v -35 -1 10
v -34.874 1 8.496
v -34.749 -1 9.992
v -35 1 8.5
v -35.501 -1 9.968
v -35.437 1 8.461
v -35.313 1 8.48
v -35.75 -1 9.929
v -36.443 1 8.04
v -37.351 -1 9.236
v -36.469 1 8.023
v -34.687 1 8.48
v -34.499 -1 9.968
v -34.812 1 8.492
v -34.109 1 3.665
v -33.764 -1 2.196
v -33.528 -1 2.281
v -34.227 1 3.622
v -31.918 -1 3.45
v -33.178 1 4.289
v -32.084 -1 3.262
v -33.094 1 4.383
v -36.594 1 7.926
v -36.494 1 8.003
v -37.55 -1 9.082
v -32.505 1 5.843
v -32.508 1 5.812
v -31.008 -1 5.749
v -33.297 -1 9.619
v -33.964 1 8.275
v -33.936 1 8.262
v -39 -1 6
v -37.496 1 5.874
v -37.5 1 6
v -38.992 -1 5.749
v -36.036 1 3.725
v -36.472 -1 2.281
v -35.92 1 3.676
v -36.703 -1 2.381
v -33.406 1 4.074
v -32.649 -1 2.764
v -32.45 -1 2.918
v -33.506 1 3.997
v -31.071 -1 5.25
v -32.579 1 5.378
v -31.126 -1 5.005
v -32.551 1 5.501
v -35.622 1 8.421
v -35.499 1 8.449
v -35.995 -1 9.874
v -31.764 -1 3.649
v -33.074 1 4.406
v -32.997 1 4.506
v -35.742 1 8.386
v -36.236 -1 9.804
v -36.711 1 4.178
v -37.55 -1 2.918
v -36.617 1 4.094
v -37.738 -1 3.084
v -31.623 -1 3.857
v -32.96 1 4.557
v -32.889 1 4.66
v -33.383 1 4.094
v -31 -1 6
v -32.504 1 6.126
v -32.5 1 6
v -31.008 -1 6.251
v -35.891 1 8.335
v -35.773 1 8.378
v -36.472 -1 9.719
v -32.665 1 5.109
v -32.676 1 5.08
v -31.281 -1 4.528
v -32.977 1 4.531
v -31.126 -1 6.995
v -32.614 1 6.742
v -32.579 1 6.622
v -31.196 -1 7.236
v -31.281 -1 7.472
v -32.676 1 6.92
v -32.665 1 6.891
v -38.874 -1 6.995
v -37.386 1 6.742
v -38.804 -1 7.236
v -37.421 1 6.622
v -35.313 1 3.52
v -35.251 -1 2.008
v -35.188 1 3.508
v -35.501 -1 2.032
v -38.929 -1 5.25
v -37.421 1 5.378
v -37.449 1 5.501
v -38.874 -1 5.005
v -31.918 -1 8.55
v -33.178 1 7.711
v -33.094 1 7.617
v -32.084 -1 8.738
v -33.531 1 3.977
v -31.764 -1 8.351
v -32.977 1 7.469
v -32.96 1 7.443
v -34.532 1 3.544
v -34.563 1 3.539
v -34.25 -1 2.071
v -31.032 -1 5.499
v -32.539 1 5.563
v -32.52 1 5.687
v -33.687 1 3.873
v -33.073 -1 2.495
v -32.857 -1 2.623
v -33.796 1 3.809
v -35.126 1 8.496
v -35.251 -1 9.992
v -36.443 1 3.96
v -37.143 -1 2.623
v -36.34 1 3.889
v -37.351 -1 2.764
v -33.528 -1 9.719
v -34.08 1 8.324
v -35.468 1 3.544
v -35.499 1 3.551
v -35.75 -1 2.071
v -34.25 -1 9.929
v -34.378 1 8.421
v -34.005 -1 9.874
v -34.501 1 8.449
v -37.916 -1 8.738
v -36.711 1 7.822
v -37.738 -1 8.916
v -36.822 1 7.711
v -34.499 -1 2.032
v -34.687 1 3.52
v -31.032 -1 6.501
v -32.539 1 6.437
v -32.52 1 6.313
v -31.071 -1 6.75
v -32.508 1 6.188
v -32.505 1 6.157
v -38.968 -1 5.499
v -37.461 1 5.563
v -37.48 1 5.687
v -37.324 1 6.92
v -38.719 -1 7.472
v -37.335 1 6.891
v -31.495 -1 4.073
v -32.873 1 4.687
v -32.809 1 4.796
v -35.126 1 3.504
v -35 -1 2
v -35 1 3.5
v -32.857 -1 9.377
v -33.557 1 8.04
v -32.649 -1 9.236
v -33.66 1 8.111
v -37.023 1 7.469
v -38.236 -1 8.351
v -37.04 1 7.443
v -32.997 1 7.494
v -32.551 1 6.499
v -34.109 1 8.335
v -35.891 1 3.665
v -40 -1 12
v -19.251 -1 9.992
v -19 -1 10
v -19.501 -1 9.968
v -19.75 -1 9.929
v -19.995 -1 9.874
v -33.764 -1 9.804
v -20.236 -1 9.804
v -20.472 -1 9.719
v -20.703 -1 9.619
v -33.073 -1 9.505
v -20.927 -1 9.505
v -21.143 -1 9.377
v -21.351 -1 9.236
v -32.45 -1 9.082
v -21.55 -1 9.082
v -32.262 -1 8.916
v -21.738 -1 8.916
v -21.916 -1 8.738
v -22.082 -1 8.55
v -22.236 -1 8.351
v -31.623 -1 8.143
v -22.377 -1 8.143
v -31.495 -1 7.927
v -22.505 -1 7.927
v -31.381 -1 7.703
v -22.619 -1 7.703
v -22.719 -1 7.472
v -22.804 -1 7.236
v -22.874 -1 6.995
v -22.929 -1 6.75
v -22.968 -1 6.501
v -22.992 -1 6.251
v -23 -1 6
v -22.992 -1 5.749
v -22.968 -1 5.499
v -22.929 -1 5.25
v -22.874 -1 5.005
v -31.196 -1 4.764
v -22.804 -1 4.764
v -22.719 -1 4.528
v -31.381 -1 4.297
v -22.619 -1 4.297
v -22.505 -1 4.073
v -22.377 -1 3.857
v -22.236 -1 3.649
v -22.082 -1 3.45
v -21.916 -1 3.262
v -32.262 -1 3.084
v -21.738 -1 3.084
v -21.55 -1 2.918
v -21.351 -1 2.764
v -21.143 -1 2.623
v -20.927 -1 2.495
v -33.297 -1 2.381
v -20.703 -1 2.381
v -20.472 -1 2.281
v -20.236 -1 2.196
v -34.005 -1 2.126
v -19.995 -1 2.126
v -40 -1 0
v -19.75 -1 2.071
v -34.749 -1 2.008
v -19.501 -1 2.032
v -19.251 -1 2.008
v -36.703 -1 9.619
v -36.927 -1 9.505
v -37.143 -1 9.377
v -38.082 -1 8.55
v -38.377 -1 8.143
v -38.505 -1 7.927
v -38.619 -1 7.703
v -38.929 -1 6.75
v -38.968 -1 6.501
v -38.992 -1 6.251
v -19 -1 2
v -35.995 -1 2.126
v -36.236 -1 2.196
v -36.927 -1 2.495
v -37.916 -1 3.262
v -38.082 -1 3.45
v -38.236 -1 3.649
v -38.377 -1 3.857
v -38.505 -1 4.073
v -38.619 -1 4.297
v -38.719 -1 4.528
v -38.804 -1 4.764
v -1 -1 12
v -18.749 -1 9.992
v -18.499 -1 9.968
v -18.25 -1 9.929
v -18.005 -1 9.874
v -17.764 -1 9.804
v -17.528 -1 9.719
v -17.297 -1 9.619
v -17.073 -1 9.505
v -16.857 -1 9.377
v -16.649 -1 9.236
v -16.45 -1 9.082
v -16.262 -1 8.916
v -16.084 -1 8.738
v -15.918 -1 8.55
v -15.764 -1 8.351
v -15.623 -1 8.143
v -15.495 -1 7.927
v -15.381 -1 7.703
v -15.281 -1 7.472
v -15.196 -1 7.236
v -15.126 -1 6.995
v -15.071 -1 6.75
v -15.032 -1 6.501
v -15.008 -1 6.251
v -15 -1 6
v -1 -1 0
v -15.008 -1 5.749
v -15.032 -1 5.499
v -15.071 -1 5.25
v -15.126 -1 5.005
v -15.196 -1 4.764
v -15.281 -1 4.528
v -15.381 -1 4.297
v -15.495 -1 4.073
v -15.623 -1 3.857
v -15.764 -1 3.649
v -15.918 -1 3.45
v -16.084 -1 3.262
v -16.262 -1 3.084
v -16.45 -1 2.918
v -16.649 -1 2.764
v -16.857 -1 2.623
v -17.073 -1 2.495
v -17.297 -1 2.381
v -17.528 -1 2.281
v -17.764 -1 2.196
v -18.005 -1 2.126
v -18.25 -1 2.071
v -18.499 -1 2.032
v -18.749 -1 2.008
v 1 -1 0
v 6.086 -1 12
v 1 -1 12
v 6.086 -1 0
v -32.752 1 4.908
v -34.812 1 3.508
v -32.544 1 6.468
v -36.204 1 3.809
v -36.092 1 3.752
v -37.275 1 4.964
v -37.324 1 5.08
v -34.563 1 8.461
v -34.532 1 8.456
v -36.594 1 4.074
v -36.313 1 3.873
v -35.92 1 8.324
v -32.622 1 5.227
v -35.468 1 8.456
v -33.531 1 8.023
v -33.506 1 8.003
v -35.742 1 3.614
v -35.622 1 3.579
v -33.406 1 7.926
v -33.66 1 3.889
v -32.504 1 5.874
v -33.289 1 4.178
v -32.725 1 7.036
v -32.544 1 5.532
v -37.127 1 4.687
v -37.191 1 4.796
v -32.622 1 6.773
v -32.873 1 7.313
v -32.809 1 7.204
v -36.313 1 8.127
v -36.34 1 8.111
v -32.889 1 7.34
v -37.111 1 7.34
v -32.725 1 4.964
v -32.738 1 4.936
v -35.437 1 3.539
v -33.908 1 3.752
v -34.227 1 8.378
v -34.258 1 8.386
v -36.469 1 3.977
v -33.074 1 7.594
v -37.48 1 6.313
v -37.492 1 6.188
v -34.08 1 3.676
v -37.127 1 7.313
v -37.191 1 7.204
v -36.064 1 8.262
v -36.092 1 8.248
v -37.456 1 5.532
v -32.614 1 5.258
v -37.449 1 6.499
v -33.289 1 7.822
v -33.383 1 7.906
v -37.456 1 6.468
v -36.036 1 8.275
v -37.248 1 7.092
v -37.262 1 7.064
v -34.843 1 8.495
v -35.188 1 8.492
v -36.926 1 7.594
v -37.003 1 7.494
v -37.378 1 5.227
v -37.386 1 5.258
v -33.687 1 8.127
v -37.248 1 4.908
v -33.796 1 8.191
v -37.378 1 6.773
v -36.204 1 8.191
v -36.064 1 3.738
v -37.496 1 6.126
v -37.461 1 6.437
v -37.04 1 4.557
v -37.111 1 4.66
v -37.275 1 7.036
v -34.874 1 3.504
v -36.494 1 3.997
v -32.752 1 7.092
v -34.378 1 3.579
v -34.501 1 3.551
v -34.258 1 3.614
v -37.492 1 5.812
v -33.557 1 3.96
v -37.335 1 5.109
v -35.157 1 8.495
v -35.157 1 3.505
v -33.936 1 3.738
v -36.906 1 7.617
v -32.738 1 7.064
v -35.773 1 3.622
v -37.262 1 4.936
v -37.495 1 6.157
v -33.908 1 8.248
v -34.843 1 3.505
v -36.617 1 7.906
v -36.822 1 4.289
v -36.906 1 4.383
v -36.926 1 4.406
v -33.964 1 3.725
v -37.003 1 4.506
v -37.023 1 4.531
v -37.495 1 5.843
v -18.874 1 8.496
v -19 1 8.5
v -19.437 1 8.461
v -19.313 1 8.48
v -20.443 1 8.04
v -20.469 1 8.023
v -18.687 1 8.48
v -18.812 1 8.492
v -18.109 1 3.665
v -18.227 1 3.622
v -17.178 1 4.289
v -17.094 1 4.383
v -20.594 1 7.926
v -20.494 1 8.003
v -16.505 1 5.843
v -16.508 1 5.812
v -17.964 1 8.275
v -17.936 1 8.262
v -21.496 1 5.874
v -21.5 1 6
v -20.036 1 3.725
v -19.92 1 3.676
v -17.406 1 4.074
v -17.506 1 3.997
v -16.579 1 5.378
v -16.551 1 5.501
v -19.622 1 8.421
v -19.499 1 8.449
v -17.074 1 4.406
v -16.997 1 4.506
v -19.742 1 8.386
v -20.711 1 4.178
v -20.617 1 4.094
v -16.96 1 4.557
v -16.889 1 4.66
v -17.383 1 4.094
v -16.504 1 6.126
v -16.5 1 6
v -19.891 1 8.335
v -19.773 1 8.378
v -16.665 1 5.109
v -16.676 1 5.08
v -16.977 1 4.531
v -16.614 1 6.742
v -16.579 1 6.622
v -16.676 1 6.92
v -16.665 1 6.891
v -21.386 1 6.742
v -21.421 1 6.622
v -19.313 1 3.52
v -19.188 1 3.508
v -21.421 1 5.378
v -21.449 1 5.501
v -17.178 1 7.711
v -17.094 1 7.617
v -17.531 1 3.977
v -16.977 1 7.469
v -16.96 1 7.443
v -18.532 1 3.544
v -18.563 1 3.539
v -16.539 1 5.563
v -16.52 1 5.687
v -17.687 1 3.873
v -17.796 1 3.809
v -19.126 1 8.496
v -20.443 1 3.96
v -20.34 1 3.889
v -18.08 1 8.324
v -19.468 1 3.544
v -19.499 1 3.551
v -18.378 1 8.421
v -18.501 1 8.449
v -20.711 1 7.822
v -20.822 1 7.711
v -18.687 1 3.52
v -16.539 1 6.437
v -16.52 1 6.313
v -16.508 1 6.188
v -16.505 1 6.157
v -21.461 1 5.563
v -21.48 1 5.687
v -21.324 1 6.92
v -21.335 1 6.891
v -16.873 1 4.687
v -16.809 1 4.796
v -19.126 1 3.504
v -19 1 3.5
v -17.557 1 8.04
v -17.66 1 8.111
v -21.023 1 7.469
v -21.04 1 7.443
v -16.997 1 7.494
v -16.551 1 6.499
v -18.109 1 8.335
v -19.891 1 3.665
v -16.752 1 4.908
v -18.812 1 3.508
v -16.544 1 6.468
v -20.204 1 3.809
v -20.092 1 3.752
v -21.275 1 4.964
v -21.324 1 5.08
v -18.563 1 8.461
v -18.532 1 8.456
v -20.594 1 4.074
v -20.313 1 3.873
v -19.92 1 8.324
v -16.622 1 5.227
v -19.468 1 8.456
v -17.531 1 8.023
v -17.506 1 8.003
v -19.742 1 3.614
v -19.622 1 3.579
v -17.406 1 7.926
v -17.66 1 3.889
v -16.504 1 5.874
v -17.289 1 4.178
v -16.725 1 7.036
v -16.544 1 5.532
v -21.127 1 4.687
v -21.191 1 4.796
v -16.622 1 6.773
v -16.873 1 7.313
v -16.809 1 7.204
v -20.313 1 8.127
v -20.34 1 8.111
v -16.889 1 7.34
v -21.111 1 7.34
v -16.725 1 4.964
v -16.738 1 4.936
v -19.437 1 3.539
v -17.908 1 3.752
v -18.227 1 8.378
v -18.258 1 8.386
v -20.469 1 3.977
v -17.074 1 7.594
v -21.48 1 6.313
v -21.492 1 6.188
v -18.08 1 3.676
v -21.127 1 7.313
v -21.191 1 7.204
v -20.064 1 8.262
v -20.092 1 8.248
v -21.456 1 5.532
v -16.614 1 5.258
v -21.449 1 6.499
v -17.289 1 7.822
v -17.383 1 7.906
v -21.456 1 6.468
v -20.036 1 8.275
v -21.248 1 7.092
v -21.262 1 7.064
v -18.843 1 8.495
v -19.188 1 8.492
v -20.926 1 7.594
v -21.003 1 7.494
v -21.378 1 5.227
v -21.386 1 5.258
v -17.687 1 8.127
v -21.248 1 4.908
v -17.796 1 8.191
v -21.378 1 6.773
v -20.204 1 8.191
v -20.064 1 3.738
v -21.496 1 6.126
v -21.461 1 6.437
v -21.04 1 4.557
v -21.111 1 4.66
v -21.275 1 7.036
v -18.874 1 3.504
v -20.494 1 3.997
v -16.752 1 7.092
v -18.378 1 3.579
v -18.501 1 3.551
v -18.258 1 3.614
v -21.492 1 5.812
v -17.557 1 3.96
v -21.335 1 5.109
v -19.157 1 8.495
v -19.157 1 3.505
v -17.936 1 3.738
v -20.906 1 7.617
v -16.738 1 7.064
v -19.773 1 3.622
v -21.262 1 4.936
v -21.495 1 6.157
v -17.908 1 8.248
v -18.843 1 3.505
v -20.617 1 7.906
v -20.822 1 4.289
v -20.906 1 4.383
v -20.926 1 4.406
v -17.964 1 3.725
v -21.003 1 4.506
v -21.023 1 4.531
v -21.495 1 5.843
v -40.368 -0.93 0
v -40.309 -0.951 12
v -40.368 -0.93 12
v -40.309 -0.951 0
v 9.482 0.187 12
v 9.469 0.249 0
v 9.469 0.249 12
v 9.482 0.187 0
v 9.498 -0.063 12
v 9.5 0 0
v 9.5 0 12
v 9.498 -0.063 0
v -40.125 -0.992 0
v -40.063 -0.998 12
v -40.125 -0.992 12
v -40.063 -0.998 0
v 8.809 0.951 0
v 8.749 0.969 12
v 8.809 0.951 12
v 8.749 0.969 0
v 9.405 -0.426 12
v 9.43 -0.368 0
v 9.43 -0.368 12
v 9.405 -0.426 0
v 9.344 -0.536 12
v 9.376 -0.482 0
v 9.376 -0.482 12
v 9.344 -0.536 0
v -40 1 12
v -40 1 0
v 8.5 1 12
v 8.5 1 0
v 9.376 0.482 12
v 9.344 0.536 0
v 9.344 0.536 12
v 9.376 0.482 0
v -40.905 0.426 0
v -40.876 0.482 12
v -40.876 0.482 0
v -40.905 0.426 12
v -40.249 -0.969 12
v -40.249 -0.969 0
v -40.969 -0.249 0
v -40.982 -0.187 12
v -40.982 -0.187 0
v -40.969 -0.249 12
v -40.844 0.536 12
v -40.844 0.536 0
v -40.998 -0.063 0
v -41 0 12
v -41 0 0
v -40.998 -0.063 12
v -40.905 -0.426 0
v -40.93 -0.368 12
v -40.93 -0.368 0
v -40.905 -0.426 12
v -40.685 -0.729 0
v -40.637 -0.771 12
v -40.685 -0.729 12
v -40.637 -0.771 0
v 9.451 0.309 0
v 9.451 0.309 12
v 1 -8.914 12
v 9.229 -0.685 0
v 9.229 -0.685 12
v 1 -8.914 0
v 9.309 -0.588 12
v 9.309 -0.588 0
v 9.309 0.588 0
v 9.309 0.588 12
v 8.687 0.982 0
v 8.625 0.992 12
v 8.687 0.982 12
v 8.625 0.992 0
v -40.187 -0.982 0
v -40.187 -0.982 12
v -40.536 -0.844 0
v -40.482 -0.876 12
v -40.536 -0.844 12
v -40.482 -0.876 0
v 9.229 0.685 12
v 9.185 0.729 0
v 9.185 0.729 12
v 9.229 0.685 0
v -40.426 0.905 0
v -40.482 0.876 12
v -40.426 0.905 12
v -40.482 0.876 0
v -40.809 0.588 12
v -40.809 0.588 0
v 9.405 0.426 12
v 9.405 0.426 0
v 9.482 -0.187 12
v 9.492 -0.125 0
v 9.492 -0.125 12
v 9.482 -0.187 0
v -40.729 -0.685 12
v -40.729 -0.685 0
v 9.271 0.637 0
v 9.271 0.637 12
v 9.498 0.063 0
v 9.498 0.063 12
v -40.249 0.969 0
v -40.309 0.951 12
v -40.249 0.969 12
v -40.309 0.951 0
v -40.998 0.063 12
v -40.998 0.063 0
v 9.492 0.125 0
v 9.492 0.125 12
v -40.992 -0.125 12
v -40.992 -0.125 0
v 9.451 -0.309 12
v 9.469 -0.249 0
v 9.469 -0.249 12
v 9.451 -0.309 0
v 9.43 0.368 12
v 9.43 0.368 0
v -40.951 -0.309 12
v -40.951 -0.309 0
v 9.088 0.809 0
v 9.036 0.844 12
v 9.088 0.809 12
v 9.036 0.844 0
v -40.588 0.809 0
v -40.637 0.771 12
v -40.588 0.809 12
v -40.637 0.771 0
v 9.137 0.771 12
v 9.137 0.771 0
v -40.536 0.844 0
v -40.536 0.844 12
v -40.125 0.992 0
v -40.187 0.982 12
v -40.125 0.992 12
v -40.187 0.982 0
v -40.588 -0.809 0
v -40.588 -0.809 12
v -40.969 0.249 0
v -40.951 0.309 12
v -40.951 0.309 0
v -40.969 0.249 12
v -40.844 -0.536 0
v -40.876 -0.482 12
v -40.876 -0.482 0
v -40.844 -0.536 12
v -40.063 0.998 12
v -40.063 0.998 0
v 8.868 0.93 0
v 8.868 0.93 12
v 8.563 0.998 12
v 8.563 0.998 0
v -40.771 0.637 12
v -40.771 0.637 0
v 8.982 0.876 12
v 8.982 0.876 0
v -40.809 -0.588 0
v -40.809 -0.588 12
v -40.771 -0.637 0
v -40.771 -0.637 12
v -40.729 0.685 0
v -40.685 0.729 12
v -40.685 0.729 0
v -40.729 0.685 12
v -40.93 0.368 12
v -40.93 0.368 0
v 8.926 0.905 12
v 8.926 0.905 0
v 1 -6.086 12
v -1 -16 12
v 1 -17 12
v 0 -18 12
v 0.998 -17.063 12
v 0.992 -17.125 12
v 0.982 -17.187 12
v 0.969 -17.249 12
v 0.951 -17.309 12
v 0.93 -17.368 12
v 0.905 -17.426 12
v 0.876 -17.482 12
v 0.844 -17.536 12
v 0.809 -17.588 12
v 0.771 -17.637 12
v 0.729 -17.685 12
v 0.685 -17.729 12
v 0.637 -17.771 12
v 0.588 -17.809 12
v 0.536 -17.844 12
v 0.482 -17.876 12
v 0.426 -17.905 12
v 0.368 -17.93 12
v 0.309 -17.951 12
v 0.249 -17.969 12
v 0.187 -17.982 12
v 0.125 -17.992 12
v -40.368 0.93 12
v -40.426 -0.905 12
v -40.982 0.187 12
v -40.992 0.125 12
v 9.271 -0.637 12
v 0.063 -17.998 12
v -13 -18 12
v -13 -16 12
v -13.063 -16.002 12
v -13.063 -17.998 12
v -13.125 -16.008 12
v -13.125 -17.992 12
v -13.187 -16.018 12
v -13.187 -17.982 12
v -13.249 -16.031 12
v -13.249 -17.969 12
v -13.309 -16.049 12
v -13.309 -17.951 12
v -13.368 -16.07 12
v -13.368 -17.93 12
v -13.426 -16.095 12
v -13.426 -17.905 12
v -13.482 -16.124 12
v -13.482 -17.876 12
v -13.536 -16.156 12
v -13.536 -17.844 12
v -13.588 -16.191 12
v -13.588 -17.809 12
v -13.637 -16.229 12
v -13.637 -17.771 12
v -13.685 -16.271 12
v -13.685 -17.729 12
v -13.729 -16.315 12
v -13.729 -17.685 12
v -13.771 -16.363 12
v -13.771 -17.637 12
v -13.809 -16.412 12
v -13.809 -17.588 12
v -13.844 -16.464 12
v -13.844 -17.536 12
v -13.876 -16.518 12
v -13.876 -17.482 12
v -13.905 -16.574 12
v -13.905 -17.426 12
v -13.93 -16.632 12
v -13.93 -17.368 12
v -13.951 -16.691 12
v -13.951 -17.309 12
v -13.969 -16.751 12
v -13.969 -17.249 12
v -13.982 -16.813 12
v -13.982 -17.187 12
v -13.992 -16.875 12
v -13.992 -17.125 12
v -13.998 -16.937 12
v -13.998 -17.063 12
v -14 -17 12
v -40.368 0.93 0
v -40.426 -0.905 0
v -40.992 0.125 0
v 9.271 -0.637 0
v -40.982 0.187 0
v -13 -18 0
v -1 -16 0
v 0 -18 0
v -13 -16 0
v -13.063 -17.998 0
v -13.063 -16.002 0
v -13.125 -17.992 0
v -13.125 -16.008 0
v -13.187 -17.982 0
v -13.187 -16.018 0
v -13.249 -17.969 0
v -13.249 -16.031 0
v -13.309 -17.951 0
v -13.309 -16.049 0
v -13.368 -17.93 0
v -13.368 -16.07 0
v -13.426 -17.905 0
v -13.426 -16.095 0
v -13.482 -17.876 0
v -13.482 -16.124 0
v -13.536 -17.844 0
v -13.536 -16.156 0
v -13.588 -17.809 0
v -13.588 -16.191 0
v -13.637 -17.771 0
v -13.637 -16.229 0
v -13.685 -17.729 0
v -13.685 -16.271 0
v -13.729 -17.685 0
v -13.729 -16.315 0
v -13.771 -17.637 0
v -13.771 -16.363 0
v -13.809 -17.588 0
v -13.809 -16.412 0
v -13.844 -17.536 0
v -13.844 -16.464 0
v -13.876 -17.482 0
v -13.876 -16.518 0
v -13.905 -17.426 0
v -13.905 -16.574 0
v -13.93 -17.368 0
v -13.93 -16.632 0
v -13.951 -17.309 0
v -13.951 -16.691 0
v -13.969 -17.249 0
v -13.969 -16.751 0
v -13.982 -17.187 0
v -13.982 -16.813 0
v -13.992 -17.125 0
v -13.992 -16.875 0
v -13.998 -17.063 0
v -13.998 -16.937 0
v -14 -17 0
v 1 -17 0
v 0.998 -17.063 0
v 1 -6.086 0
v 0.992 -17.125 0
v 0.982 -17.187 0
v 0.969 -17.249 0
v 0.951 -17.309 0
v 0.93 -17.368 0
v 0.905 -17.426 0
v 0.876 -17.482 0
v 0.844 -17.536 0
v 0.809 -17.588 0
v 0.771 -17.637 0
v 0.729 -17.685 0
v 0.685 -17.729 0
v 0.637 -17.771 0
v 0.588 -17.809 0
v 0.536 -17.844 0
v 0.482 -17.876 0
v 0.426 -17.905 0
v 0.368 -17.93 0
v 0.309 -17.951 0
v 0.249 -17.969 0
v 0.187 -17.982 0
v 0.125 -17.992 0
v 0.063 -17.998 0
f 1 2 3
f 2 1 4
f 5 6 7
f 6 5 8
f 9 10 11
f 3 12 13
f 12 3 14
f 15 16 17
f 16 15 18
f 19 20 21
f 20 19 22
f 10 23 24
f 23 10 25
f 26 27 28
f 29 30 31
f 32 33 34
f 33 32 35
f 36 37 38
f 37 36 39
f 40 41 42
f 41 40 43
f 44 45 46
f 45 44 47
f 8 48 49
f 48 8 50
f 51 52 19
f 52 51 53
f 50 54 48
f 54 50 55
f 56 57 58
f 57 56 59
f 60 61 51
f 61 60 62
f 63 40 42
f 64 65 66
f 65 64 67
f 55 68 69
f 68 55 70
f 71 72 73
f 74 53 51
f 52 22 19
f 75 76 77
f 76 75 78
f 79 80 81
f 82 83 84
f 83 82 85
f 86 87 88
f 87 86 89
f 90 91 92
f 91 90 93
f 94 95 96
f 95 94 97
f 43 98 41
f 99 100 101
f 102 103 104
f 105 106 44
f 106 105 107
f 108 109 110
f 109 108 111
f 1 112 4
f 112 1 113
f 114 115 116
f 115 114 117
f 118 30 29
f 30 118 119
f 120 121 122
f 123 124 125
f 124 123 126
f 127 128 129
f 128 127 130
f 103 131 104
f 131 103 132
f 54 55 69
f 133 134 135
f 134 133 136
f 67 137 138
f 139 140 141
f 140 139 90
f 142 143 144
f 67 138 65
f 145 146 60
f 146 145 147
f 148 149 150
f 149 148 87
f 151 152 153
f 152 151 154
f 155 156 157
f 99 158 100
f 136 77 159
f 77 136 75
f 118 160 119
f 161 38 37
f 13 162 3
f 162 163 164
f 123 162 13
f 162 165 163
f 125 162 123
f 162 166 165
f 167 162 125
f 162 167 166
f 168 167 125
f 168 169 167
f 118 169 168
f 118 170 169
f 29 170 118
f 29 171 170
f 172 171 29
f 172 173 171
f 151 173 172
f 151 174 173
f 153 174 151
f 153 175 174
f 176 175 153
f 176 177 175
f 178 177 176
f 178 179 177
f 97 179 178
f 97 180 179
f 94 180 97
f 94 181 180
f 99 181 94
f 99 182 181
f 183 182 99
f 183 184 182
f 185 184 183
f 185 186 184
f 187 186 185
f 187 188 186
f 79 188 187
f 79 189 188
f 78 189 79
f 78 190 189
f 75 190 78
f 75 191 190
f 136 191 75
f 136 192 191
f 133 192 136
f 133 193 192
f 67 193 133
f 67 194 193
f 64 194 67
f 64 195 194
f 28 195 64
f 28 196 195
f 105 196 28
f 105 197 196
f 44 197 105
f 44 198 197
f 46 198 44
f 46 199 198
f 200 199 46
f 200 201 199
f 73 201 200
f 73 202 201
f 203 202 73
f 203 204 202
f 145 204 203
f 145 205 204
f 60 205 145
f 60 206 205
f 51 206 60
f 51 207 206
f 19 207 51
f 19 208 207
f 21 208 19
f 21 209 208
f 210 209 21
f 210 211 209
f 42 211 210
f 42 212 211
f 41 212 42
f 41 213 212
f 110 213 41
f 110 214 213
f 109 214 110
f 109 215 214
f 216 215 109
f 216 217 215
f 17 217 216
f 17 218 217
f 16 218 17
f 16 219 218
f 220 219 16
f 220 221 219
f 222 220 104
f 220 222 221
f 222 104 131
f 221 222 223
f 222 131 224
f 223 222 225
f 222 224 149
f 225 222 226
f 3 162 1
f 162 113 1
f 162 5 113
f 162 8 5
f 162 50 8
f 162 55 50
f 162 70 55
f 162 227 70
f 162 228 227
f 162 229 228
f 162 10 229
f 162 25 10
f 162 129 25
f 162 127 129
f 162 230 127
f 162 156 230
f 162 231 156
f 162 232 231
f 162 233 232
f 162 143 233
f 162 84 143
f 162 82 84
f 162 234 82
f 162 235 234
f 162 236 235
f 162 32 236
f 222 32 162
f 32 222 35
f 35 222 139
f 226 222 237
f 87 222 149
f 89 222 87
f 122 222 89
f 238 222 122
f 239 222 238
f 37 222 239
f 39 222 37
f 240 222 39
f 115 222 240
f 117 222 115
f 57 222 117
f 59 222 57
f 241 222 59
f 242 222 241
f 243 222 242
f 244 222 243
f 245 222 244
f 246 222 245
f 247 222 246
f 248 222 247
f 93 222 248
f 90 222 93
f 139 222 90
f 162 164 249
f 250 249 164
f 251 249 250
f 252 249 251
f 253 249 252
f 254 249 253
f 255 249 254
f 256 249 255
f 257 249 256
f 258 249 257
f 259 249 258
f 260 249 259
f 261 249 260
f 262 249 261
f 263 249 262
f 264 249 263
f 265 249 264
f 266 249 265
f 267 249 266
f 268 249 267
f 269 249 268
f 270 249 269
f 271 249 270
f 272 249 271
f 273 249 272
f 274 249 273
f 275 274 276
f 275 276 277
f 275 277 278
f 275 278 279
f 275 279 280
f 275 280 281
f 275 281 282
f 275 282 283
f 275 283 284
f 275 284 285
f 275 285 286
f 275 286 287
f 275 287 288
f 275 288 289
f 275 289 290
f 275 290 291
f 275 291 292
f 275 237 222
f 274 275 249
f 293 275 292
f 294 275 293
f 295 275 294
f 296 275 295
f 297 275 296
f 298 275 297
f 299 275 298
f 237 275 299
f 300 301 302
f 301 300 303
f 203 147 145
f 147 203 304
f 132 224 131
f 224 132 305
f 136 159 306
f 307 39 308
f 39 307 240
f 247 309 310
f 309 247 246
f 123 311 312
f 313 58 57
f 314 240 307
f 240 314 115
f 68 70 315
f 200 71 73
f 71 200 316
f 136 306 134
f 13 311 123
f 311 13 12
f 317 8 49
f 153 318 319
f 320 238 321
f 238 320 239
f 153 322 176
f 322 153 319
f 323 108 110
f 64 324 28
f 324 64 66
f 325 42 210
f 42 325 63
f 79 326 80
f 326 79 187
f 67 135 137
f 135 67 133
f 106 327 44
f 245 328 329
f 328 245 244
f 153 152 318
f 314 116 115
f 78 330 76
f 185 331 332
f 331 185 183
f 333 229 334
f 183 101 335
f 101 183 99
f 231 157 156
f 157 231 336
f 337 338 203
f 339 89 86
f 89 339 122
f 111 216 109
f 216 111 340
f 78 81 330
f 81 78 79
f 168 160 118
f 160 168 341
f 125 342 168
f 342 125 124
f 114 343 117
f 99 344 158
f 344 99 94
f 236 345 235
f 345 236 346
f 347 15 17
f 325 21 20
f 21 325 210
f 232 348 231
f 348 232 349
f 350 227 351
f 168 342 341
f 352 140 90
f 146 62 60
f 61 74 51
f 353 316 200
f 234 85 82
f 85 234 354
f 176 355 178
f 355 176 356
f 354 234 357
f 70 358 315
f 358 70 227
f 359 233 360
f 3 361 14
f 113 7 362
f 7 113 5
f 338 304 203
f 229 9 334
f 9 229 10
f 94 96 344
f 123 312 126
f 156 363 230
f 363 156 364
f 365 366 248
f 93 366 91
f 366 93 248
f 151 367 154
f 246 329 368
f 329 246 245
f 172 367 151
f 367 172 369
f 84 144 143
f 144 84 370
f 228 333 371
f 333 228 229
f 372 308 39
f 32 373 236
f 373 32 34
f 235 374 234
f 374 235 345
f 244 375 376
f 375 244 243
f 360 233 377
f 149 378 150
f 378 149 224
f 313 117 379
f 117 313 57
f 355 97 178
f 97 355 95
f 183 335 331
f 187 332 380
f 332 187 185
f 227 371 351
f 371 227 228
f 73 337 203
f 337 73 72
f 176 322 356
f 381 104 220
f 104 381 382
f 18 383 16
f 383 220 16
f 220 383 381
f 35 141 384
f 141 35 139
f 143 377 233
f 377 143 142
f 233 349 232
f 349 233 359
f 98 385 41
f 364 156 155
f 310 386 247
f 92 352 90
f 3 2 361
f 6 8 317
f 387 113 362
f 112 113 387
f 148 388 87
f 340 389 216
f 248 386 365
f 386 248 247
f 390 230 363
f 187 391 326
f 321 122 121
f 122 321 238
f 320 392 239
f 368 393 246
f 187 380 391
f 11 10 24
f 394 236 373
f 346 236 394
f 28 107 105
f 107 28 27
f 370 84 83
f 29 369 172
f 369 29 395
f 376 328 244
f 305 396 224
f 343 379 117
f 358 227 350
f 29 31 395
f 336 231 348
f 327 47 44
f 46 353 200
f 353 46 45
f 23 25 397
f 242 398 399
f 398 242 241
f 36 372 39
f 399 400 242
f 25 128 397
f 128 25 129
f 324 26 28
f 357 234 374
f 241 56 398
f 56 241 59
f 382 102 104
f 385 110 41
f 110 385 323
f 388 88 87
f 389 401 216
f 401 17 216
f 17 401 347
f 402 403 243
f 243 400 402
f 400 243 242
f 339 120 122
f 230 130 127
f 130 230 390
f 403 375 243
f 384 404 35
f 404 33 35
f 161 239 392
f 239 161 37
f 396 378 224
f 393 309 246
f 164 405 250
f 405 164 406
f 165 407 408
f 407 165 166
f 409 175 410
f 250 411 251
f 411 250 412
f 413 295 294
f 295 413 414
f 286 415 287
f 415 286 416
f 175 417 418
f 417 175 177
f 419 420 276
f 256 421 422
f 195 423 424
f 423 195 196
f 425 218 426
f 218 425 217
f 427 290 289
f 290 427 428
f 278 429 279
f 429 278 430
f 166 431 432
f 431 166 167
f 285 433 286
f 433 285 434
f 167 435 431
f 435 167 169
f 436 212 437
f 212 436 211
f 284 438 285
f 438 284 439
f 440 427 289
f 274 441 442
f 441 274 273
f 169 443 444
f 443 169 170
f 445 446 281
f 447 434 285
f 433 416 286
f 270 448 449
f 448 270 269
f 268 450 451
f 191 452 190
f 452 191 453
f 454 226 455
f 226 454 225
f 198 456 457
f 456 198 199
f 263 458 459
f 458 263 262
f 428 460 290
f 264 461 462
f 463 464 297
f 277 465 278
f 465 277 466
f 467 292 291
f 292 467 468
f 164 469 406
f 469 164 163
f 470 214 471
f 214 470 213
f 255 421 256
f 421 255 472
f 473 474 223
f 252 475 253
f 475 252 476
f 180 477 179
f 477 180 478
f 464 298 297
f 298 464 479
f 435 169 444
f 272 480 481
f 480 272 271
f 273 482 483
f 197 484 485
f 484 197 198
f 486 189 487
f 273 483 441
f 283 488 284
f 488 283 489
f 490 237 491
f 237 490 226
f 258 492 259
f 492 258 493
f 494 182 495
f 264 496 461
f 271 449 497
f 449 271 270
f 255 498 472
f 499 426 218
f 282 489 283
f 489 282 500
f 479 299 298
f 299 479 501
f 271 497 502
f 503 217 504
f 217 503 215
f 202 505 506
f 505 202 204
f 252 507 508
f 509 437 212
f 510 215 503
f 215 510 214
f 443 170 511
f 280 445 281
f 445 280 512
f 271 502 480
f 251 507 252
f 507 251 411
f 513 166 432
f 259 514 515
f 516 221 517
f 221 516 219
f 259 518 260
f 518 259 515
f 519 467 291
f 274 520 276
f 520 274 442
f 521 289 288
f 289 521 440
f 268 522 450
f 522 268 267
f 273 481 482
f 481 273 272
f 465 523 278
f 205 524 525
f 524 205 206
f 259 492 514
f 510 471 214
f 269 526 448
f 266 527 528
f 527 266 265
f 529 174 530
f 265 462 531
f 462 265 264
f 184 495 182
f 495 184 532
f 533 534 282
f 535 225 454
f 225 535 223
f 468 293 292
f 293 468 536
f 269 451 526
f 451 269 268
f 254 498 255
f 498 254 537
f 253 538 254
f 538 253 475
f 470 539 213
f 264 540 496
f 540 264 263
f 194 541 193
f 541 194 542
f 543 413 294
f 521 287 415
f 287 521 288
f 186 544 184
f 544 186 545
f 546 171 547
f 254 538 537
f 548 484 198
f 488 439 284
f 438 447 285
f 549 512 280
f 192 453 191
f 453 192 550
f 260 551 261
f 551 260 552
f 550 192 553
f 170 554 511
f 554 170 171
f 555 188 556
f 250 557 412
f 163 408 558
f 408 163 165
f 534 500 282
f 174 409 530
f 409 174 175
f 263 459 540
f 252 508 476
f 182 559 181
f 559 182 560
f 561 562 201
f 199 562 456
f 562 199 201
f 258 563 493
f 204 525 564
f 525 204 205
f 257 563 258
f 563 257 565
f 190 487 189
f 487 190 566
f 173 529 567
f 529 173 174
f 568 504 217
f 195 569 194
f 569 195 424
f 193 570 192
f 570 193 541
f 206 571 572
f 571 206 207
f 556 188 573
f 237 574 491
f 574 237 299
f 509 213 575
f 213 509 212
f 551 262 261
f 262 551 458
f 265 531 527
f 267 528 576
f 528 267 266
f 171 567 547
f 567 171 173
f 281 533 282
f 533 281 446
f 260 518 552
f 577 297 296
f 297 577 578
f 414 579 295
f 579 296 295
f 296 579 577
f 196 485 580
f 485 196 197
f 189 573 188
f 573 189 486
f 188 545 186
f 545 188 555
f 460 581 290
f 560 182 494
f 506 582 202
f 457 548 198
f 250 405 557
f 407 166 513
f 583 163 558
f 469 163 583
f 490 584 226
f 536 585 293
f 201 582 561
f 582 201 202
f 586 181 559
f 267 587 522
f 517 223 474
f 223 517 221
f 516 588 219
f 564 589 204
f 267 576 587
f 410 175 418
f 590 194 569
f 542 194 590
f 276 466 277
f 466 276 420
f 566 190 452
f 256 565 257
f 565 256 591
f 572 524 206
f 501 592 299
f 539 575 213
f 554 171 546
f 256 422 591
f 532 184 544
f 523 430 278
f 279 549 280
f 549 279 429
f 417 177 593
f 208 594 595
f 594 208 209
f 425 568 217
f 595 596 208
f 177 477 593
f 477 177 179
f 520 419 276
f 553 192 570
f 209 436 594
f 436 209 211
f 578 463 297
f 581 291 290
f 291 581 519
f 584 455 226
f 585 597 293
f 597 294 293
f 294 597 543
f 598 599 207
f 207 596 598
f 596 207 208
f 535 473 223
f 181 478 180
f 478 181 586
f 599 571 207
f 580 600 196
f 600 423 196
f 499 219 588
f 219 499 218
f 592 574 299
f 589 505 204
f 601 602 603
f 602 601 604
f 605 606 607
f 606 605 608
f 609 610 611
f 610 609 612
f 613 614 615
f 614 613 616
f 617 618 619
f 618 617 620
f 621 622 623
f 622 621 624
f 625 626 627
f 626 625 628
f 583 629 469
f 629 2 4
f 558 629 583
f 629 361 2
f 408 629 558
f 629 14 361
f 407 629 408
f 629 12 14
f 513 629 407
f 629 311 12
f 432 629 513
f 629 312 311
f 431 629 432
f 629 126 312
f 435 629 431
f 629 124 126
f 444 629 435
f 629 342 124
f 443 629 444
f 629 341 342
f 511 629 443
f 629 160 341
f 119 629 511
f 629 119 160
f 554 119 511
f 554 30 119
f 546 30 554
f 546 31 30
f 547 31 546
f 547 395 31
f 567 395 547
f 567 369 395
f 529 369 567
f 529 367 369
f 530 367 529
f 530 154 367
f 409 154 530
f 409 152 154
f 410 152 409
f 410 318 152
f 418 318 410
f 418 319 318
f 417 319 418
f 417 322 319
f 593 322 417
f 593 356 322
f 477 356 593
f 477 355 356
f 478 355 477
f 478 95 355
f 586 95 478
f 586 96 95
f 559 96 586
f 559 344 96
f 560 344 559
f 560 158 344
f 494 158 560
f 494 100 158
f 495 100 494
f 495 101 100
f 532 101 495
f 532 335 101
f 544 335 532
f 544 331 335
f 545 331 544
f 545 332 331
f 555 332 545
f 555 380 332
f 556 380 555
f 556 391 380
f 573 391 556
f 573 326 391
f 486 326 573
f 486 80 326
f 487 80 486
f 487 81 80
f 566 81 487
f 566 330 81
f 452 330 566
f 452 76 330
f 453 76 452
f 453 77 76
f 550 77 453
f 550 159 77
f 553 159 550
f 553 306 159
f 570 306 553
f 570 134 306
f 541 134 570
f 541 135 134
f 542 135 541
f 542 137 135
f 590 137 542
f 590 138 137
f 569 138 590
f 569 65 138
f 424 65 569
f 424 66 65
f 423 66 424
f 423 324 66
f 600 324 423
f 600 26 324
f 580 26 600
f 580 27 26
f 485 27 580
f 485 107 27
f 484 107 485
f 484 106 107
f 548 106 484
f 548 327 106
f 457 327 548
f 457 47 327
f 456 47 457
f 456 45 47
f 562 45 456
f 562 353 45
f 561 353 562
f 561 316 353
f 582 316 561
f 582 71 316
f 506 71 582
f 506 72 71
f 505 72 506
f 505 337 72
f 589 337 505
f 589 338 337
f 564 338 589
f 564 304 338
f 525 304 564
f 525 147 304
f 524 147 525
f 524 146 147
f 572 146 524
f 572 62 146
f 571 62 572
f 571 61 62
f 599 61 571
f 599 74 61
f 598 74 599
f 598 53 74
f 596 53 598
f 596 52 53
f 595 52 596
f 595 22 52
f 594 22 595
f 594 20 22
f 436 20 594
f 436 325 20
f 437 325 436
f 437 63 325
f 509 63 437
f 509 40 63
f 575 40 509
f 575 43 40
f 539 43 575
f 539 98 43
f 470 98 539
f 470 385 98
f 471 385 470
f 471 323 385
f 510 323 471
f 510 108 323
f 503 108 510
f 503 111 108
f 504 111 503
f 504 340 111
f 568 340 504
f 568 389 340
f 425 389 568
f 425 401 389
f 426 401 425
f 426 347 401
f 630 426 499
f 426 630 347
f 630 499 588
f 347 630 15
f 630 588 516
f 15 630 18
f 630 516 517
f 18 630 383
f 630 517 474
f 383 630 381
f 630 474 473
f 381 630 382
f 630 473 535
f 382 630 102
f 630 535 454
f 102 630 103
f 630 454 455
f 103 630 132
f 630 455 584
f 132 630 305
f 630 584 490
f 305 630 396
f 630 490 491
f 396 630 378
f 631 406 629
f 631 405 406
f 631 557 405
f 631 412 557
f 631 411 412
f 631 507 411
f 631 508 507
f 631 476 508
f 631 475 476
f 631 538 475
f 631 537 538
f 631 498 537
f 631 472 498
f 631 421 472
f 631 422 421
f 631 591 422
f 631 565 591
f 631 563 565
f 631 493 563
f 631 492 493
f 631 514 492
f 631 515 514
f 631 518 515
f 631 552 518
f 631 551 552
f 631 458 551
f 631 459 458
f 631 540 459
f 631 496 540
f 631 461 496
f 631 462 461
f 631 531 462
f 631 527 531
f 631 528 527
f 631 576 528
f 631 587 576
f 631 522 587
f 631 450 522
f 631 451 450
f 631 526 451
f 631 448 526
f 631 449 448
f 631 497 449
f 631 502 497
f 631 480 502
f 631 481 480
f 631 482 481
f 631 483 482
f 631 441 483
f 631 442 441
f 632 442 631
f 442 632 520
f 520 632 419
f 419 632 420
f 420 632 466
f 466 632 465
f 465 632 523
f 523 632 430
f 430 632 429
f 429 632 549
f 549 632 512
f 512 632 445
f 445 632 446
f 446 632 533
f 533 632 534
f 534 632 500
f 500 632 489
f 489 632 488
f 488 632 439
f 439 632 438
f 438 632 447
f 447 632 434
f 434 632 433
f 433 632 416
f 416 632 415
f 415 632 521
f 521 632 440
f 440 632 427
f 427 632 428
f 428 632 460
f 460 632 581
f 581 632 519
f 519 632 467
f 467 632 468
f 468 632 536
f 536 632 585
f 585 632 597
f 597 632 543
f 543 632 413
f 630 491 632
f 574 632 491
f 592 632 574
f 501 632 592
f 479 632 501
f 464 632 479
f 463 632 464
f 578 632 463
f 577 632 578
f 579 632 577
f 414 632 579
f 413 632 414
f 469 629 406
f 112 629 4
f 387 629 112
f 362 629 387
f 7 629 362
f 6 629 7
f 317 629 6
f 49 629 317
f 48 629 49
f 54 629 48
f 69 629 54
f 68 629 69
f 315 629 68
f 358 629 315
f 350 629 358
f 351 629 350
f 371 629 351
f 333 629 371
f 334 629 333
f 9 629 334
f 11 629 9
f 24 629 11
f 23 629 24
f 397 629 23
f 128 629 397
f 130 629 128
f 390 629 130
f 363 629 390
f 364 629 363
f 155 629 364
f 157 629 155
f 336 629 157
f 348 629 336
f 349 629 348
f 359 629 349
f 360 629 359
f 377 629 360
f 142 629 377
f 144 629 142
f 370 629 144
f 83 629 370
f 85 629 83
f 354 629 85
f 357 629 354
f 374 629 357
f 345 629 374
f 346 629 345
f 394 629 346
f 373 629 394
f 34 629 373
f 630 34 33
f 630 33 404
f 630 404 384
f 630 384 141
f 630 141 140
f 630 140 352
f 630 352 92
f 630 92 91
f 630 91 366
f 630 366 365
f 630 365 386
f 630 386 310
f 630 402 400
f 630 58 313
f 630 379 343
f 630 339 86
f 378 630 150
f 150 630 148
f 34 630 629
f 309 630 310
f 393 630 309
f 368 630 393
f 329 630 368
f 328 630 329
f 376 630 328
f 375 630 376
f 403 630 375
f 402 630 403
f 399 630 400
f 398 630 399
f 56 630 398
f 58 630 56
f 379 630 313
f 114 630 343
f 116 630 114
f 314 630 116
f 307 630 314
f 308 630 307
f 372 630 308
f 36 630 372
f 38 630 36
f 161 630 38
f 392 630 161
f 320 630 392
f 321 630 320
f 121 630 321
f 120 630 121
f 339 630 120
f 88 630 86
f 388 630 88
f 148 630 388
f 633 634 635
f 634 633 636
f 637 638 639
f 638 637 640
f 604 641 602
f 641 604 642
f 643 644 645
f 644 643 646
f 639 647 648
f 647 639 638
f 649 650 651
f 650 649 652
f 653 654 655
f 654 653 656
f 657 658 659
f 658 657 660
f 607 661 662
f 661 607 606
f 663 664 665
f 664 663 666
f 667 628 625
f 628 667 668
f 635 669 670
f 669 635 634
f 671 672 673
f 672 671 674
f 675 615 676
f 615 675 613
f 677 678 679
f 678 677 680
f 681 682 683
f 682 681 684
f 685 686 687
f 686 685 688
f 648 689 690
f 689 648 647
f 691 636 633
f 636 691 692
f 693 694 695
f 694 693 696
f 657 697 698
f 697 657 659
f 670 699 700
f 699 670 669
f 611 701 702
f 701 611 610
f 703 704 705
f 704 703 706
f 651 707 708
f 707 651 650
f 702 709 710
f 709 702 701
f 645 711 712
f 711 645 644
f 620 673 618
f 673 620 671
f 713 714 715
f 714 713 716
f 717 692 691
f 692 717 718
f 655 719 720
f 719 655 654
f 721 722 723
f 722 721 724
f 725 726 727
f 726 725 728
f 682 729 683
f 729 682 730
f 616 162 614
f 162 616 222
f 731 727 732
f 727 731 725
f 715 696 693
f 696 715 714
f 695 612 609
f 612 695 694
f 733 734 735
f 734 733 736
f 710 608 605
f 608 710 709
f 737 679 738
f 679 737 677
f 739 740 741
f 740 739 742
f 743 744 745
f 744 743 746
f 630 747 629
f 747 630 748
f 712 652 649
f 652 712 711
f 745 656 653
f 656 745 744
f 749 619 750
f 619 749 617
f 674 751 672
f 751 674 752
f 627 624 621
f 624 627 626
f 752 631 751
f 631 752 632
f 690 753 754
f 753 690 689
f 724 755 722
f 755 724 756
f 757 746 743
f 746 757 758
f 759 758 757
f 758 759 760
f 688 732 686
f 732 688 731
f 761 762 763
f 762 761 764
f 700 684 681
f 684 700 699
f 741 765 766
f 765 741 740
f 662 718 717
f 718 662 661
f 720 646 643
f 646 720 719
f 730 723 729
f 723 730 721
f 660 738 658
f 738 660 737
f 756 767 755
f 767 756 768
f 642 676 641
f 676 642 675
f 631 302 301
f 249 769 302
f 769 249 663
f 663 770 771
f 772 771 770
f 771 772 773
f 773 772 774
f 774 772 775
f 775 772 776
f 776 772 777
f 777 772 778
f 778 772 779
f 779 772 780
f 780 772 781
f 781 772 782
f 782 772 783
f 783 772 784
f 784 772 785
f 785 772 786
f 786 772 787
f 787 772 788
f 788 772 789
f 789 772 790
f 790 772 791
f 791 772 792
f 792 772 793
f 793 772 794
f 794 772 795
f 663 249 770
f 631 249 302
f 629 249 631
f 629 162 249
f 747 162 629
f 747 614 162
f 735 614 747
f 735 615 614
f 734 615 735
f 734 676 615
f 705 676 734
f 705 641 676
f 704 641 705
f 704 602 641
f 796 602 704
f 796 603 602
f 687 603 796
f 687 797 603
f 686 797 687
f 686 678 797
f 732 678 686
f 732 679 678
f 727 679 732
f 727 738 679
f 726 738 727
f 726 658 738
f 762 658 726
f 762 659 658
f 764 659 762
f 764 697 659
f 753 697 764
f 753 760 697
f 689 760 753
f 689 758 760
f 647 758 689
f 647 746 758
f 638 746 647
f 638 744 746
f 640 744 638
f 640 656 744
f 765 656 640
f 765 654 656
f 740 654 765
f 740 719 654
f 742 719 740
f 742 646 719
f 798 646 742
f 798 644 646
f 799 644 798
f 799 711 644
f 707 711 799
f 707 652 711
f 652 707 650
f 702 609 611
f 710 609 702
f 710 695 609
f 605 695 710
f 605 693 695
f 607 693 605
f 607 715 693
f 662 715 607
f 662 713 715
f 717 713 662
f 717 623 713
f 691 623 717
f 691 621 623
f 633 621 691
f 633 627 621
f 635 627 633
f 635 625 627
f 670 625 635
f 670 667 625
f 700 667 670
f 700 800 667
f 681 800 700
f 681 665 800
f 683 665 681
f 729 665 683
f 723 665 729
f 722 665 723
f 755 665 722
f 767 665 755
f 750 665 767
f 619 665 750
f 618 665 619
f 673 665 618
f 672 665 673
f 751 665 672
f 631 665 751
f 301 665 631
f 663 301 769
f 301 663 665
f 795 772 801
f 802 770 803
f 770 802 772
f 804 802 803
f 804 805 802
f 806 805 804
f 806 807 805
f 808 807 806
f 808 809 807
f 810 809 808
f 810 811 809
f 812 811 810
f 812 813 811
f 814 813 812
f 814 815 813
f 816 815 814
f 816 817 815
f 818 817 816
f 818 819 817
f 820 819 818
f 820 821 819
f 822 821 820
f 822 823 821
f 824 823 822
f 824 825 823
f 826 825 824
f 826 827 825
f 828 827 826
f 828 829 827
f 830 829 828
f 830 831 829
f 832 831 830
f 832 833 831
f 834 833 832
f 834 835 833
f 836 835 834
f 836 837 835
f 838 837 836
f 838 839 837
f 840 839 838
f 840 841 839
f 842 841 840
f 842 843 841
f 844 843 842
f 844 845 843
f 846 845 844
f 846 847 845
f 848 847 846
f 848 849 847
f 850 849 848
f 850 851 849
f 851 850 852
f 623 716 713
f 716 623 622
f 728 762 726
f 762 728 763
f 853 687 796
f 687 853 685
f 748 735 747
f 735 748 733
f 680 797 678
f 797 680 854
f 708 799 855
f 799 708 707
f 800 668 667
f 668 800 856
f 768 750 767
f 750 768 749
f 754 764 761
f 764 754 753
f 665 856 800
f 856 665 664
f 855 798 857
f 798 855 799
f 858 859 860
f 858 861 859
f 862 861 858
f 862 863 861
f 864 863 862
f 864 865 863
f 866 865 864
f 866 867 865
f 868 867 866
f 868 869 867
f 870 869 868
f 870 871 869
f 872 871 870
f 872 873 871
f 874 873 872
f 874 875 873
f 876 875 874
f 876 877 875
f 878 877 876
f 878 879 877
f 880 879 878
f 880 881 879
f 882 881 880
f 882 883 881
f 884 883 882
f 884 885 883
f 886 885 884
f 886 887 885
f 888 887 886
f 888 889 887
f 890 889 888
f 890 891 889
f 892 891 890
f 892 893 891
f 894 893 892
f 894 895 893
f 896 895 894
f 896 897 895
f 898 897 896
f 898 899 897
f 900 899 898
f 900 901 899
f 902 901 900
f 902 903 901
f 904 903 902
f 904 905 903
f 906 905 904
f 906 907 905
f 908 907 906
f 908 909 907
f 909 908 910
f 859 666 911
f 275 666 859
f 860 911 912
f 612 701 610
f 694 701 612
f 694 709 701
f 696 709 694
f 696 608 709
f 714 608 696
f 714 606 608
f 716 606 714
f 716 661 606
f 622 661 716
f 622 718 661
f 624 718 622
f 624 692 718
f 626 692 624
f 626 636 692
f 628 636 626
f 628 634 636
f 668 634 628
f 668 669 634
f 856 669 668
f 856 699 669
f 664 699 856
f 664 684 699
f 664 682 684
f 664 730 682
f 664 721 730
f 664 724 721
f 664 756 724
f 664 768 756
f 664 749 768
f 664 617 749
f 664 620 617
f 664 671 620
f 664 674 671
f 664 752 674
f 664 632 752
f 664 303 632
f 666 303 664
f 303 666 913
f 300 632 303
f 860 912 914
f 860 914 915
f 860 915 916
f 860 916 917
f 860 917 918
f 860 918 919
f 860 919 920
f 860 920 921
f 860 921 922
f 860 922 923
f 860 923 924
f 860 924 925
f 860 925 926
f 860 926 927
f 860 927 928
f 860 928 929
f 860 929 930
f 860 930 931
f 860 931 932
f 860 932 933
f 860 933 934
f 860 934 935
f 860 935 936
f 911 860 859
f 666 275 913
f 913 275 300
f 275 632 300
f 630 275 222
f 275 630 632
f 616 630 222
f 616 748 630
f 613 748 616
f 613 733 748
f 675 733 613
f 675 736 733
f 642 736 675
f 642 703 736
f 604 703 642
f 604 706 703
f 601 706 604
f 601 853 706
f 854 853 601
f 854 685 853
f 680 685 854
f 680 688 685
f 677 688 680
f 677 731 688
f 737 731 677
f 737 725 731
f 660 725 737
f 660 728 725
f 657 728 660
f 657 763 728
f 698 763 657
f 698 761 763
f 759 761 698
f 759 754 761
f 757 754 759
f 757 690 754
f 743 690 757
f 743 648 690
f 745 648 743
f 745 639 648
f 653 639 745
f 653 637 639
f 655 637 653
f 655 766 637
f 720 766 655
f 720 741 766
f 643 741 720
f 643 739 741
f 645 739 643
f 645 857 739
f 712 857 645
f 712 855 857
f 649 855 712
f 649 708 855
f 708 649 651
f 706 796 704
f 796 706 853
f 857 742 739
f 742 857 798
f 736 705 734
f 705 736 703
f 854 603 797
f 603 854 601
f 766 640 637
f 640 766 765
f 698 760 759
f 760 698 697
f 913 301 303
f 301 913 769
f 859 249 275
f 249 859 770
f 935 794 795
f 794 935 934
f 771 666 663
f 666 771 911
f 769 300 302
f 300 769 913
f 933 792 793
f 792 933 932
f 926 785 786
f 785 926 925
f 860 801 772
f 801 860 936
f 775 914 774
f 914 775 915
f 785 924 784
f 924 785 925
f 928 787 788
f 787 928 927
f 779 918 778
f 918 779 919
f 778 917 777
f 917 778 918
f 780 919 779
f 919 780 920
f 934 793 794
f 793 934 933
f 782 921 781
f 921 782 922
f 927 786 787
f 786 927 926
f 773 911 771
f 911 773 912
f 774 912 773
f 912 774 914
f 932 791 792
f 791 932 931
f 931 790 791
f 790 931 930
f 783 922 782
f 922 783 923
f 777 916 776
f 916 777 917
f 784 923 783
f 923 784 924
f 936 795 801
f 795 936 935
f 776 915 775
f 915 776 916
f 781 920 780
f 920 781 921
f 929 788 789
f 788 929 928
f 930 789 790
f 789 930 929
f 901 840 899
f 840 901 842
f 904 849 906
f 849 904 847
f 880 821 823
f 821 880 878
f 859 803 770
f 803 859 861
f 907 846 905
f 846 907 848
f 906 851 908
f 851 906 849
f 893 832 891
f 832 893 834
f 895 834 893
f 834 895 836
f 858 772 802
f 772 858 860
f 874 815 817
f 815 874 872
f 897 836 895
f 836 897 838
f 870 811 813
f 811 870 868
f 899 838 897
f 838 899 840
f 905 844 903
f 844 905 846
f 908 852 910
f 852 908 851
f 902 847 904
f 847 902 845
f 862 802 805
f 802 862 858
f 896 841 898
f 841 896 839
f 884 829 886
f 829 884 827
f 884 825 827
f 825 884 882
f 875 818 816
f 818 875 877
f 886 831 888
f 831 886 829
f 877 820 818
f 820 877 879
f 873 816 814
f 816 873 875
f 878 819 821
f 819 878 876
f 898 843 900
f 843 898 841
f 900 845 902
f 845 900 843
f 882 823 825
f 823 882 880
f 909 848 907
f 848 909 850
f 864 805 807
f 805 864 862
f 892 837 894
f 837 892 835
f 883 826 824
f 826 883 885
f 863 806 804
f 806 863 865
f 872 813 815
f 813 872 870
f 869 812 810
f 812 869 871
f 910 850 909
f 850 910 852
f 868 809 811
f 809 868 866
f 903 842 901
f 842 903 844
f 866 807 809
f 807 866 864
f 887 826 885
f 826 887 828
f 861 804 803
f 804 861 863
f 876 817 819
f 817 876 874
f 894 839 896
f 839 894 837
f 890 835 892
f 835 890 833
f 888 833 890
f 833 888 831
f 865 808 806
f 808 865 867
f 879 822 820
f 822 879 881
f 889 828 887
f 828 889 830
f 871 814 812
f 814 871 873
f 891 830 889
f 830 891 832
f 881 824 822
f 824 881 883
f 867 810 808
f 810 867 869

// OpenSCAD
height_back = 42;
height_front = 15;
inner_depth = 15;
width = 12;
hole = 4;
thickness = 2;
strut = true;

$fn = 100;
fillet = thickness/2;

module corner() {
    rotate([0, 90, 0])    
    cylinder(h = width, r = fillet);
}

module back() {
    difference() {
        hull() {
            translate([0, 0, strut ? -inner_depth/2 - fillet : 0])
            corner();
            
            translate([0, 0, height_back - fillet * 2])
            corner();
        }
        
        for ( i = [0 : height_back / hole / 2 / 2 - 1]) {
            translate([width/2, -fillet, height_back - fillet - hole - hole/2 - hole * 2 * 2 * i])
            rotate([-90, 0, 0])
            union() {
                cylinder(h=hole, r1=hole, r2=1);
                
                translate([0, 0, fillet])
                cylinder(h=fillet * 2, r1=hole/2, r2=hole/2);
            }
        }
    }

    if (strut) {
        hull() {
            translate([0, -inner_depth/2 - fillet, 0])
            corner();        

            translate([0, 0, strut ? -inner_depth/2 - fillet : 0])
            corner();
        }
    }
}

module bottom() {
    hull() {
        corner();

        translate([0, -(inner_depth + fillet * 2), 0])
        corner();
    }
}

module front() {
    translate([0, -(inner_depth + fillet * 2), 0])
    hull() {
        corner();
        
        translate([0, 0, height_front - fillet * 2])
        corner();
    }
}

rotate([0, -90, 0])
union() {
    back();
    bottom();
    front();
}
